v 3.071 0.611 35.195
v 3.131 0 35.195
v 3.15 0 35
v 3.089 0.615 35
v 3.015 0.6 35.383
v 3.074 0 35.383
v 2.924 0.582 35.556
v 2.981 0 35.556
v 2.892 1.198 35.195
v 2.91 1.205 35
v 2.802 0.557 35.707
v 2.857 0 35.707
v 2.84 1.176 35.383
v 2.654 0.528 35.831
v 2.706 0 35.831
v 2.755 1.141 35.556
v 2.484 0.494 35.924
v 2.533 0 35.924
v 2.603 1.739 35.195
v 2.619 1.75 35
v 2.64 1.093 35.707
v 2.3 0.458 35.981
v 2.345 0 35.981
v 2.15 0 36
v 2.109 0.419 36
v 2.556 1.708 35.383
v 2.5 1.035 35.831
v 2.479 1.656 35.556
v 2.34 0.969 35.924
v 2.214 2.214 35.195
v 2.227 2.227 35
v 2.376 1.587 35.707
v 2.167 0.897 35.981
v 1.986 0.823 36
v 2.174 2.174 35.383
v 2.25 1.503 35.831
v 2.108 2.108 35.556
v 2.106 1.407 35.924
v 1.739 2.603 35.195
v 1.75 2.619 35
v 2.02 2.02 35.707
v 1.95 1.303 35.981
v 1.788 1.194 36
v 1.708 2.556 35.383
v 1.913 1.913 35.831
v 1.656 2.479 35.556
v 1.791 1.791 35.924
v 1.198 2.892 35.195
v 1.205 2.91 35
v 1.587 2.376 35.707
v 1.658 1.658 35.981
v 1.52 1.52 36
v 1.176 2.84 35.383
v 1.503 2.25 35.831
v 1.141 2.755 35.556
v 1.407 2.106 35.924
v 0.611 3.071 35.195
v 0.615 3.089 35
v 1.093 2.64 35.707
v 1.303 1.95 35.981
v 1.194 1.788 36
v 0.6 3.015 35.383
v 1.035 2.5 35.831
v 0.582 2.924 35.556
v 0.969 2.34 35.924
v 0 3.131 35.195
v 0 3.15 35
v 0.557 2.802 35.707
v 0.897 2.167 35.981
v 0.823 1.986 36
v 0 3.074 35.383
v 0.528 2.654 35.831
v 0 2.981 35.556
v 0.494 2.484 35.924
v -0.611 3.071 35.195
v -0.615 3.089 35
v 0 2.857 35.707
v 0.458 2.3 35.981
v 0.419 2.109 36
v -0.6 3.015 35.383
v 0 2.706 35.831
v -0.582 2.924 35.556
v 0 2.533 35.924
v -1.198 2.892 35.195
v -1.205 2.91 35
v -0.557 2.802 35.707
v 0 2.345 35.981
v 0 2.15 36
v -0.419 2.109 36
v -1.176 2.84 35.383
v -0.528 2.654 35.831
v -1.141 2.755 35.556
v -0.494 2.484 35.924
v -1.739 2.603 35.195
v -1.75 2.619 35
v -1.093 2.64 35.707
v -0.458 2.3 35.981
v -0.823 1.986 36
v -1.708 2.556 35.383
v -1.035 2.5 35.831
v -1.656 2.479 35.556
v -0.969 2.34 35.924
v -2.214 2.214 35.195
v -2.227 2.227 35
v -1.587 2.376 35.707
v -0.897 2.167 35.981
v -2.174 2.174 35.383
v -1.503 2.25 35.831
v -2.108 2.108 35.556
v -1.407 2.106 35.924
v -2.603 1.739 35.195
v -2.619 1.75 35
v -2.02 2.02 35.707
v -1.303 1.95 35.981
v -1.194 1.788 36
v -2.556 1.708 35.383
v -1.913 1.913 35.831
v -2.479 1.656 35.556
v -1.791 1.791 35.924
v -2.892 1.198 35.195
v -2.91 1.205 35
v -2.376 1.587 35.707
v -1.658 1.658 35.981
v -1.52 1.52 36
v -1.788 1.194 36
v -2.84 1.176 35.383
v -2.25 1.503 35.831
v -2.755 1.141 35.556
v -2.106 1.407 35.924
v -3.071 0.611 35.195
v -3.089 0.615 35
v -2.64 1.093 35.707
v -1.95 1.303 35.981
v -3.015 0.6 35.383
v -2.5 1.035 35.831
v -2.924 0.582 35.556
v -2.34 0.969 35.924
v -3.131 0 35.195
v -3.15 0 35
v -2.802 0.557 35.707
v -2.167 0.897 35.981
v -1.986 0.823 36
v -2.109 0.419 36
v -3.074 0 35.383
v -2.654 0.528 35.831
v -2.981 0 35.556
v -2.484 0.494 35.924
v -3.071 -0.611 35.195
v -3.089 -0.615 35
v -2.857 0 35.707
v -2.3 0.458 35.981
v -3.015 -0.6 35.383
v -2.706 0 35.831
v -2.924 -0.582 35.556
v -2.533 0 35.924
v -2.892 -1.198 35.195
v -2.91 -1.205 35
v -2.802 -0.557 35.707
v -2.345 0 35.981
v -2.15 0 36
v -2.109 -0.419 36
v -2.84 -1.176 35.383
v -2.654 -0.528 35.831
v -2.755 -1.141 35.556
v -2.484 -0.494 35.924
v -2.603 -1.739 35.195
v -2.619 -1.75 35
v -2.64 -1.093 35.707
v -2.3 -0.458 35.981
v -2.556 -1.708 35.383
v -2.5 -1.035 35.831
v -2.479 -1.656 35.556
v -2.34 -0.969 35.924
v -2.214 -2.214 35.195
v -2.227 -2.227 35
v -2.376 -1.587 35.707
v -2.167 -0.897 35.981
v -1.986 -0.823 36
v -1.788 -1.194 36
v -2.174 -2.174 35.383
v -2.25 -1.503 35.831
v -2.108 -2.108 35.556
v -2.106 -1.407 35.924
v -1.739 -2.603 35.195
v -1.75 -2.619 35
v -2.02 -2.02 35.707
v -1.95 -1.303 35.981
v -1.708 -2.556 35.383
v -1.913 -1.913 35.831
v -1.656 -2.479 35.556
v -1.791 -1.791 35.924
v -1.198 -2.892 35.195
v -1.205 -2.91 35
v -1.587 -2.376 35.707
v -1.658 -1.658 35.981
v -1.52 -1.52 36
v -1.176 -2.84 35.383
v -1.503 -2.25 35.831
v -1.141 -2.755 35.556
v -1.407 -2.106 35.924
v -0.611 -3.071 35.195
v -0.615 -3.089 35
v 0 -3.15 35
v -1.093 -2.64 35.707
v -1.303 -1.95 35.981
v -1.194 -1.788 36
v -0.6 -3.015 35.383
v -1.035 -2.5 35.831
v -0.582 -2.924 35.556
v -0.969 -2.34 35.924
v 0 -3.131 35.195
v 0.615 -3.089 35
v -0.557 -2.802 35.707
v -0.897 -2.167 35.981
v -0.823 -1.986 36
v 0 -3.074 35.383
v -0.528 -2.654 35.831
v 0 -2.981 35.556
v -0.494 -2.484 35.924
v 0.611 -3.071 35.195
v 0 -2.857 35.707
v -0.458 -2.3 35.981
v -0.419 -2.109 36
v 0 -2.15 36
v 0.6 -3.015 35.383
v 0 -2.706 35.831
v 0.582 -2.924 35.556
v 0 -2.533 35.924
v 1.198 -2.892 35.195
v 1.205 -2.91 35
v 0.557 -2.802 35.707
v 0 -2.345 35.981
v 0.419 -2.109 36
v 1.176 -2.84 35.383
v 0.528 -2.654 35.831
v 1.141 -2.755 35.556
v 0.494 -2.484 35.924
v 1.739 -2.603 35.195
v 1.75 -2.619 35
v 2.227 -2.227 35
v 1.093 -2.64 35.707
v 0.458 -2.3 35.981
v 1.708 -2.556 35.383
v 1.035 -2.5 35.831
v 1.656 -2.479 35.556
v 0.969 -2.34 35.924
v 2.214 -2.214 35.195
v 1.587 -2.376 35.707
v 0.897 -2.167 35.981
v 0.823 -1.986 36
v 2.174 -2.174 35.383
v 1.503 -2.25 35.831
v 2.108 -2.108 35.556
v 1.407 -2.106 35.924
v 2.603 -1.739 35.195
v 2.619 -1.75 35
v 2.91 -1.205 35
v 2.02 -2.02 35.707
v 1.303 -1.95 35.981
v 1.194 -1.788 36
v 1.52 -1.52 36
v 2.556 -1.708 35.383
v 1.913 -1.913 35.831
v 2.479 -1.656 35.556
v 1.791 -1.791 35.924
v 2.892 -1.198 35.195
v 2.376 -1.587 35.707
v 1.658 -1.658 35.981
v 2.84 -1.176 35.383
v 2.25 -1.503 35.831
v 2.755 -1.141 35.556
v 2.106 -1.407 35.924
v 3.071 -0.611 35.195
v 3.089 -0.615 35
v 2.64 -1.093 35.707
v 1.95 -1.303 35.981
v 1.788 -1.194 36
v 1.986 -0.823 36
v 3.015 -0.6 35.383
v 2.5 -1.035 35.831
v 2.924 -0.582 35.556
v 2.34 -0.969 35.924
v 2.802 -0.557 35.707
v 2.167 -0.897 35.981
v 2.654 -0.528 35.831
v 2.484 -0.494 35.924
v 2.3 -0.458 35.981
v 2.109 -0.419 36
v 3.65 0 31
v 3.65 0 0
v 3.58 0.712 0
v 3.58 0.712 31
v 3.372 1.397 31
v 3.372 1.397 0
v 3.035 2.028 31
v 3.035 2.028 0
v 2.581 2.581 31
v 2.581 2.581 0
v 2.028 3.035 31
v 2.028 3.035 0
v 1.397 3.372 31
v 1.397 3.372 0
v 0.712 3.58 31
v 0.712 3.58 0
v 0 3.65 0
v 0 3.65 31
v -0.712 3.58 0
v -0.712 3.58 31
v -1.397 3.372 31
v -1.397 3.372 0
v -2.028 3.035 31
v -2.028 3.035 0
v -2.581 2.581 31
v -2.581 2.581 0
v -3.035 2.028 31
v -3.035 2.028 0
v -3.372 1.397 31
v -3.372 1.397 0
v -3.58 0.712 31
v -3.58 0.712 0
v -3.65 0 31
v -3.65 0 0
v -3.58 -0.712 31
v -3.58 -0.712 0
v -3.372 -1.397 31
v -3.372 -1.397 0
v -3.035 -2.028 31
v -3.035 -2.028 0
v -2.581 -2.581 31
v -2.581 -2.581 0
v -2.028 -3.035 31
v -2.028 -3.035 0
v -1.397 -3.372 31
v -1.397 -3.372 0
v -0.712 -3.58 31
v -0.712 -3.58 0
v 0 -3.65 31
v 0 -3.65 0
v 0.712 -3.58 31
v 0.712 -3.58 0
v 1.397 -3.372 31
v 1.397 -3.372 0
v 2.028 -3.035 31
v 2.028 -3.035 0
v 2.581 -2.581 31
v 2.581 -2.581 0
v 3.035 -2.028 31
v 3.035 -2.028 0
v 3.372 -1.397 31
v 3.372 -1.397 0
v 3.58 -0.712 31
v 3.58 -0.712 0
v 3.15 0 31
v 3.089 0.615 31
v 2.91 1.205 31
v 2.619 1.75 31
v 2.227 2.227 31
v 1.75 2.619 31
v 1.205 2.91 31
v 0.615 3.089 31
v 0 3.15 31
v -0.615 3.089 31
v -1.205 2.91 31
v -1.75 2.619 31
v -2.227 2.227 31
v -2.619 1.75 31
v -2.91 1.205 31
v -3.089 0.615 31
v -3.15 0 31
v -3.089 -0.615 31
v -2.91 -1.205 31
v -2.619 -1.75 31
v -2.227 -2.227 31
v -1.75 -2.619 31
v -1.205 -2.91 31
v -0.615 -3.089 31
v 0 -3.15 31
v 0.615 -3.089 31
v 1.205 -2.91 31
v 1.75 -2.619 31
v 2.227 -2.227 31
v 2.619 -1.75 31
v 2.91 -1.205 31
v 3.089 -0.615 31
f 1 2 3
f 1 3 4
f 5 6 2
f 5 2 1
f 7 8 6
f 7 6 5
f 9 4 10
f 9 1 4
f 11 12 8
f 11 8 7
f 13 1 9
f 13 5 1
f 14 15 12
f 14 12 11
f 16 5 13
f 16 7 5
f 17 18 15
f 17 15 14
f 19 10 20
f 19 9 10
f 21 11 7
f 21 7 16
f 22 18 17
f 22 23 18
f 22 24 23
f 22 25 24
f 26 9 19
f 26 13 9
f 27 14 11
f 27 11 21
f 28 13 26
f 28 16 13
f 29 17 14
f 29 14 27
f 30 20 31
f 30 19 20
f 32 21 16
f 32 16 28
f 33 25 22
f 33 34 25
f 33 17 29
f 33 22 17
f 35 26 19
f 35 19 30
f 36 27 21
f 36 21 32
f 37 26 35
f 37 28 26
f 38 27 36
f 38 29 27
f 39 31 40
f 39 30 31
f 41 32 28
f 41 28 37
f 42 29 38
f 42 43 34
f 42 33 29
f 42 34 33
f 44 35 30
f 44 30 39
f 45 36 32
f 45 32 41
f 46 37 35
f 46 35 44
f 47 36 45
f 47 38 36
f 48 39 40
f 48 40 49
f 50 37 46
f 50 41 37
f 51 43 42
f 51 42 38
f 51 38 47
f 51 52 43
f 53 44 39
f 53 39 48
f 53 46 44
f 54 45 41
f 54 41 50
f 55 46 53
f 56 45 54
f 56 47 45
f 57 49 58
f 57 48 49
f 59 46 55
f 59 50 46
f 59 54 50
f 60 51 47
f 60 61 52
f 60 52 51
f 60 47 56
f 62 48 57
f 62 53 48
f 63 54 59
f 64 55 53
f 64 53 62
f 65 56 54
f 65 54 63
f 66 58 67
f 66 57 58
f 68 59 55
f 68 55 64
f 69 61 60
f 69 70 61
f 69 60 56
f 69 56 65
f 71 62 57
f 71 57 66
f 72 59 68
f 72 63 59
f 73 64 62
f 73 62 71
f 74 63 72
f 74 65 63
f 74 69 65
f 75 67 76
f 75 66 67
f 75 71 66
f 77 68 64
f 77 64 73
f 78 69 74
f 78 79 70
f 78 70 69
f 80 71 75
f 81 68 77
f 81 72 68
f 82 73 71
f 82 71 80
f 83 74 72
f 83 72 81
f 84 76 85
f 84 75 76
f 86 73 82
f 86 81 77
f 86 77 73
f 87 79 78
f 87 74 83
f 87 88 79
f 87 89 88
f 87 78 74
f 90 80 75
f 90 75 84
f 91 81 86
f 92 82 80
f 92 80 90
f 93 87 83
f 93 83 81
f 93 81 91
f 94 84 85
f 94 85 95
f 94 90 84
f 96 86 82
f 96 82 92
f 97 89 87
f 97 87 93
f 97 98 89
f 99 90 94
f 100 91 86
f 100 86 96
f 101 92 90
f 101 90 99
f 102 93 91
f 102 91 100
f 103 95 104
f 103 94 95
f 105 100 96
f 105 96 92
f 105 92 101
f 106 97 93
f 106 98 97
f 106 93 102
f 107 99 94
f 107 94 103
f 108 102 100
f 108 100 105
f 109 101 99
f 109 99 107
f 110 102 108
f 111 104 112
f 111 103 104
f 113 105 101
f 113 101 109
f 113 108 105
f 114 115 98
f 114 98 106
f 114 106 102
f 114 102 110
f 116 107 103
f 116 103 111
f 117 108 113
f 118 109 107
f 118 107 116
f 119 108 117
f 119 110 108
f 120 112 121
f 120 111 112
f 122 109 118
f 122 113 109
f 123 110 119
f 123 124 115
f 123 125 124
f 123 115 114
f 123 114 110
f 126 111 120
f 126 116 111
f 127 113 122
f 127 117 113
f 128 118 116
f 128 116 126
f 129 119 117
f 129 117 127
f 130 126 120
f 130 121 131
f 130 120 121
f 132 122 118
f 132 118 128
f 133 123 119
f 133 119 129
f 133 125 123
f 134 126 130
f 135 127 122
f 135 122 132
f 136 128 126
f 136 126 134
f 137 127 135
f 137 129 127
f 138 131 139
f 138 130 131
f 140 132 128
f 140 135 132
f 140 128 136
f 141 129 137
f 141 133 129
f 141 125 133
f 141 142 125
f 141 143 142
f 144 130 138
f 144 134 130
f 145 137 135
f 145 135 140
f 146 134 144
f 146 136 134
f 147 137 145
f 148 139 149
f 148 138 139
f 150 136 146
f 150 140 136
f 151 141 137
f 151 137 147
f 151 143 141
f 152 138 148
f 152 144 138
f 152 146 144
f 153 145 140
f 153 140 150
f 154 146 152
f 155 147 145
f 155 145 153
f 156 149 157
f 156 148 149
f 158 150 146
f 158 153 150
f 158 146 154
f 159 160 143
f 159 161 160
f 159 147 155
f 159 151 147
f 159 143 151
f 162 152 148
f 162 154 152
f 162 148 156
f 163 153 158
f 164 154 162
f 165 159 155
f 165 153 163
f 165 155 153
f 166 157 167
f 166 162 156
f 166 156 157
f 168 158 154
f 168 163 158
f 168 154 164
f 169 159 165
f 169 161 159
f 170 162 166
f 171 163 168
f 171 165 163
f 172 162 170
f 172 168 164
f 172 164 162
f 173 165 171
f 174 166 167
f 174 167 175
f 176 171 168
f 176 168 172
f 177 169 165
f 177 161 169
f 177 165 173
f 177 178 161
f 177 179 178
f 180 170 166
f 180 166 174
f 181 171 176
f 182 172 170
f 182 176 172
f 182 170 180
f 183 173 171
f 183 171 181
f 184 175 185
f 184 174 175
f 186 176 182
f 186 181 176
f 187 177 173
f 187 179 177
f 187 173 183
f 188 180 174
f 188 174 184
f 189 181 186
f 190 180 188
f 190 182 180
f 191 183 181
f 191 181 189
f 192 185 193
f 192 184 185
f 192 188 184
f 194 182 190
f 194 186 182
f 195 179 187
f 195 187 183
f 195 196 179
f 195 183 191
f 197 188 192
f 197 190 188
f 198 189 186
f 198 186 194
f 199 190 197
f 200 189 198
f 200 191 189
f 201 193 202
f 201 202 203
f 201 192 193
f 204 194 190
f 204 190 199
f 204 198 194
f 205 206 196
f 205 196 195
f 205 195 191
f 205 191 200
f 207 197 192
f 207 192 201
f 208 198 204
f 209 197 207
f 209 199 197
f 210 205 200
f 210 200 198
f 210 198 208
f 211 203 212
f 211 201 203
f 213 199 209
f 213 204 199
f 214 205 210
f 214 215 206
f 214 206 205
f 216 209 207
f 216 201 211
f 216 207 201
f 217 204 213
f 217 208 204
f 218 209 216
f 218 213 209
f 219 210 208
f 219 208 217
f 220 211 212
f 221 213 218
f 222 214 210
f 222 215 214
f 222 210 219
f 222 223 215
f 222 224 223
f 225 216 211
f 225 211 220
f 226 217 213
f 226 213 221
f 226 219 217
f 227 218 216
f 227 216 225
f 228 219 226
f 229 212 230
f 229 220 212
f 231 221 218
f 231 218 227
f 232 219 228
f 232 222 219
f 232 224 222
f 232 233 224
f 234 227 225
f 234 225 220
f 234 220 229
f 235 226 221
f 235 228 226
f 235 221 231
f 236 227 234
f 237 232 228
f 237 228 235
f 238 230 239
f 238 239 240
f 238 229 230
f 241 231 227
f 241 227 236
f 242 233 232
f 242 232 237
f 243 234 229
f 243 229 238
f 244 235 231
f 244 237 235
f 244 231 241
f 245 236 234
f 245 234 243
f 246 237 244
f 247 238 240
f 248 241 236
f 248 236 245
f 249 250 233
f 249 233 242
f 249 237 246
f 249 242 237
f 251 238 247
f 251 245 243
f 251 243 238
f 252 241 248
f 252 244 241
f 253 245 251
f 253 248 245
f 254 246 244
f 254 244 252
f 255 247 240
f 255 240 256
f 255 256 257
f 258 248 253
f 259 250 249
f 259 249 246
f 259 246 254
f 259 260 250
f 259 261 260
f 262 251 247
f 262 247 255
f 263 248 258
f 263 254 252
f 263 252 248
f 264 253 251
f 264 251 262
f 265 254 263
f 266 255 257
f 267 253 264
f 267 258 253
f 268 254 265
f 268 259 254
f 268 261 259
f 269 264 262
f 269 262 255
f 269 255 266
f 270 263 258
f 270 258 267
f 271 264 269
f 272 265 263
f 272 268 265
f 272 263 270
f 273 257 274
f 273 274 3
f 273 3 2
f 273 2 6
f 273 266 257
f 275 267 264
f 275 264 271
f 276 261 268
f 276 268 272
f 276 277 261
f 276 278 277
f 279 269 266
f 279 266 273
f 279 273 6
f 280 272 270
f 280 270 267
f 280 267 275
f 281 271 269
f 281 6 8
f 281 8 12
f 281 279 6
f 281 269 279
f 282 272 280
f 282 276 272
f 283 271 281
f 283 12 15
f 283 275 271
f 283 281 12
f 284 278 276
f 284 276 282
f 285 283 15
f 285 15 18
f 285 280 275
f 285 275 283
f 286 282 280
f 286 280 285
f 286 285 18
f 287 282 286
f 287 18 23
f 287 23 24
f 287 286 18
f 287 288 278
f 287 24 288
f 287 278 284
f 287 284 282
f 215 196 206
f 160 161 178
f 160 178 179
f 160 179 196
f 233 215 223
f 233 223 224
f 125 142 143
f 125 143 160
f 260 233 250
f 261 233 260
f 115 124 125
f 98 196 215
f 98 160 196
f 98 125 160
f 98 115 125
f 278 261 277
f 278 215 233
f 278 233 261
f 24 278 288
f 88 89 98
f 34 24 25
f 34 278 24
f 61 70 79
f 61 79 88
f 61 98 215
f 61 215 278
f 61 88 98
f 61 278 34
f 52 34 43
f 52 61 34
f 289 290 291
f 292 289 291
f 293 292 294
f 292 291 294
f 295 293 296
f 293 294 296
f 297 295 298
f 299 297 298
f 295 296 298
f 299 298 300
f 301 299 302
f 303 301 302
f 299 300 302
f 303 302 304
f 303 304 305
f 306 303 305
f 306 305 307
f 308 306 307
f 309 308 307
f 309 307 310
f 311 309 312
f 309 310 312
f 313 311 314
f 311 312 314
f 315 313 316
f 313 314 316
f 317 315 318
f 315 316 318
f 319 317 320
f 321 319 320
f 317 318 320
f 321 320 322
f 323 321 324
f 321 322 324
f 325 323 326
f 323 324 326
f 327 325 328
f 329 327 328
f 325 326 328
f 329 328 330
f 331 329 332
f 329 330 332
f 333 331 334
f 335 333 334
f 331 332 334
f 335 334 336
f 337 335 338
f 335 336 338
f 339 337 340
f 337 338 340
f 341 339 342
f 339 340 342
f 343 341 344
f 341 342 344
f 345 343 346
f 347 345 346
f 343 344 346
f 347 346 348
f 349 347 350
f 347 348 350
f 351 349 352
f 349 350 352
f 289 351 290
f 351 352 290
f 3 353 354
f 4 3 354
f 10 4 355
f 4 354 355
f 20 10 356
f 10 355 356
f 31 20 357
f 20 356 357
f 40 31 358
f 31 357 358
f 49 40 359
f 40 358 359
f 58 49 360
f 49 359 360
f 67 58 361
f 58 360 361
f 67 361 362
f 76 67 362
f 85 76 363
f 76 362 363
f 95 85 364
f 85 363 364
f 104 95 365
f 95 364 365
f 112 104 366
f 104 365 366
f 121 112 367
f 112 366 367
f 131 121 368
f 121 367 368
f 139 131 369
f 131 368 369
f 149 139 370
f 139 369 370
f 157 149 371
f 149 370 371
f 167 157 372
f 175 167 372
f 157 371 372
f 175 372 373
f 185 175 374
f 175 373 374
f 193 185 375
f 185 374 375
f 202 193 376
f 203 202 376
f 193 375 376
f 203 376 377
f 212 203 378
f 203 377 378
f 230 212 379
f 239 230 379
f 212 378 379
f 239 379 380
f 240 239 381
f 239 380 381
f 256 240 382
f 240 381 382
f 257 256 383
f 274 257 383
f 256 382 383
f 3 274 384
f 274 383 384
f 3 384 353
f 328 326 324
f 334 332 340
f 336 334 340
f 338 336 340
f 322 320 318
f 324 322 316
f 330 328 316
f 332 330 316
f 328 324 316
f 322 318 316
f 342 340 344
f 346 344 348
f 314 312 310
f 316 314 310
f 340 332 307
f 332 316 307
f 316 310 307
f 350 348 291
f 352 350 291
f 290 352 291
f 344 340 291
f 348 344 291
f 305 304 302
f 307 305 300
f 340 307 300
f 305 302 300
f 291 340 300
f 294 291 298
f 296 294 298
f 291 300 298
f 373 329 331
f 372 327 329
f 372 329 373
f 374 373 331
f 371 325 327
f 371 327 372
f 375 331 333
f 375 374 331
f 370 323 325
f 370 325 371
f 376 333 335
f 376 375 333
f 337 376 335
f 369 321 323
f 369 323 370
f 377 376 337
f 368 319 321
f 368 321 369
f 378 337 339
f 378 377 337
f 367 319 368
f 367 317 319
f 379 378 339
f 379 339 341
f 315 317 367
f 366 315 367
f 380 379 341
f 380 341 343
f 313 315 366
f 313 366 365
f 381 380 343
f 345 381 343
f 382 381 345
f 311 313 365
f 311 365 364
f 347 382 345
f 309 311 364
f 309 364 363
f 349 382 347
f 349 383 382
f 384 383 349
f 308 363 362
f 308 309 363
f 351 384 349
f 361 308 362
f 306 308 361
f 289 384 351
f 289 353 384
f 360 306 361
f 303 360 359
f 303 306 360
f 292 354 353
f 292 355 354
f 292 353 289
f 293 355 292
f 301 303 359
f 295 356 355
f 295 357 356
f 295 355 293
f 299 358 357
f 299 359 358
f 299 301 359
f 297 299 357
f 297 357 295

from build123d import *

# Parameters (mm, degrees)
SKETCH_R     = 3.65
PAD_DEPTH    = 31
SKETCH001_R  = 3.15
PAD001_DEPTH = 5
FILLET_R     = 1


with BuildPart() as part:
    # Sketch → Pad (new body)
    with BuildSketch(Plane.XY):
        Circle(SKETCH_R)
    extrude(amount=PAD_DEPTH)

    # Sketch001 (on Face3 of Pad) → Pad001 (join)
    with BuildSketch(Plane.XY.offset(31)):
        Circle(SKETCH001_R)
    extrude(amount=PAD001_DEPTH)

    # Fillet
    fillet_edges = [part.edges().sort_by_distance(p)[0] for p in [
        (-3.15, 0, 36),
    ]]
    fillet(fillet_edges, radius=FILLET_R)


solid = part.part
